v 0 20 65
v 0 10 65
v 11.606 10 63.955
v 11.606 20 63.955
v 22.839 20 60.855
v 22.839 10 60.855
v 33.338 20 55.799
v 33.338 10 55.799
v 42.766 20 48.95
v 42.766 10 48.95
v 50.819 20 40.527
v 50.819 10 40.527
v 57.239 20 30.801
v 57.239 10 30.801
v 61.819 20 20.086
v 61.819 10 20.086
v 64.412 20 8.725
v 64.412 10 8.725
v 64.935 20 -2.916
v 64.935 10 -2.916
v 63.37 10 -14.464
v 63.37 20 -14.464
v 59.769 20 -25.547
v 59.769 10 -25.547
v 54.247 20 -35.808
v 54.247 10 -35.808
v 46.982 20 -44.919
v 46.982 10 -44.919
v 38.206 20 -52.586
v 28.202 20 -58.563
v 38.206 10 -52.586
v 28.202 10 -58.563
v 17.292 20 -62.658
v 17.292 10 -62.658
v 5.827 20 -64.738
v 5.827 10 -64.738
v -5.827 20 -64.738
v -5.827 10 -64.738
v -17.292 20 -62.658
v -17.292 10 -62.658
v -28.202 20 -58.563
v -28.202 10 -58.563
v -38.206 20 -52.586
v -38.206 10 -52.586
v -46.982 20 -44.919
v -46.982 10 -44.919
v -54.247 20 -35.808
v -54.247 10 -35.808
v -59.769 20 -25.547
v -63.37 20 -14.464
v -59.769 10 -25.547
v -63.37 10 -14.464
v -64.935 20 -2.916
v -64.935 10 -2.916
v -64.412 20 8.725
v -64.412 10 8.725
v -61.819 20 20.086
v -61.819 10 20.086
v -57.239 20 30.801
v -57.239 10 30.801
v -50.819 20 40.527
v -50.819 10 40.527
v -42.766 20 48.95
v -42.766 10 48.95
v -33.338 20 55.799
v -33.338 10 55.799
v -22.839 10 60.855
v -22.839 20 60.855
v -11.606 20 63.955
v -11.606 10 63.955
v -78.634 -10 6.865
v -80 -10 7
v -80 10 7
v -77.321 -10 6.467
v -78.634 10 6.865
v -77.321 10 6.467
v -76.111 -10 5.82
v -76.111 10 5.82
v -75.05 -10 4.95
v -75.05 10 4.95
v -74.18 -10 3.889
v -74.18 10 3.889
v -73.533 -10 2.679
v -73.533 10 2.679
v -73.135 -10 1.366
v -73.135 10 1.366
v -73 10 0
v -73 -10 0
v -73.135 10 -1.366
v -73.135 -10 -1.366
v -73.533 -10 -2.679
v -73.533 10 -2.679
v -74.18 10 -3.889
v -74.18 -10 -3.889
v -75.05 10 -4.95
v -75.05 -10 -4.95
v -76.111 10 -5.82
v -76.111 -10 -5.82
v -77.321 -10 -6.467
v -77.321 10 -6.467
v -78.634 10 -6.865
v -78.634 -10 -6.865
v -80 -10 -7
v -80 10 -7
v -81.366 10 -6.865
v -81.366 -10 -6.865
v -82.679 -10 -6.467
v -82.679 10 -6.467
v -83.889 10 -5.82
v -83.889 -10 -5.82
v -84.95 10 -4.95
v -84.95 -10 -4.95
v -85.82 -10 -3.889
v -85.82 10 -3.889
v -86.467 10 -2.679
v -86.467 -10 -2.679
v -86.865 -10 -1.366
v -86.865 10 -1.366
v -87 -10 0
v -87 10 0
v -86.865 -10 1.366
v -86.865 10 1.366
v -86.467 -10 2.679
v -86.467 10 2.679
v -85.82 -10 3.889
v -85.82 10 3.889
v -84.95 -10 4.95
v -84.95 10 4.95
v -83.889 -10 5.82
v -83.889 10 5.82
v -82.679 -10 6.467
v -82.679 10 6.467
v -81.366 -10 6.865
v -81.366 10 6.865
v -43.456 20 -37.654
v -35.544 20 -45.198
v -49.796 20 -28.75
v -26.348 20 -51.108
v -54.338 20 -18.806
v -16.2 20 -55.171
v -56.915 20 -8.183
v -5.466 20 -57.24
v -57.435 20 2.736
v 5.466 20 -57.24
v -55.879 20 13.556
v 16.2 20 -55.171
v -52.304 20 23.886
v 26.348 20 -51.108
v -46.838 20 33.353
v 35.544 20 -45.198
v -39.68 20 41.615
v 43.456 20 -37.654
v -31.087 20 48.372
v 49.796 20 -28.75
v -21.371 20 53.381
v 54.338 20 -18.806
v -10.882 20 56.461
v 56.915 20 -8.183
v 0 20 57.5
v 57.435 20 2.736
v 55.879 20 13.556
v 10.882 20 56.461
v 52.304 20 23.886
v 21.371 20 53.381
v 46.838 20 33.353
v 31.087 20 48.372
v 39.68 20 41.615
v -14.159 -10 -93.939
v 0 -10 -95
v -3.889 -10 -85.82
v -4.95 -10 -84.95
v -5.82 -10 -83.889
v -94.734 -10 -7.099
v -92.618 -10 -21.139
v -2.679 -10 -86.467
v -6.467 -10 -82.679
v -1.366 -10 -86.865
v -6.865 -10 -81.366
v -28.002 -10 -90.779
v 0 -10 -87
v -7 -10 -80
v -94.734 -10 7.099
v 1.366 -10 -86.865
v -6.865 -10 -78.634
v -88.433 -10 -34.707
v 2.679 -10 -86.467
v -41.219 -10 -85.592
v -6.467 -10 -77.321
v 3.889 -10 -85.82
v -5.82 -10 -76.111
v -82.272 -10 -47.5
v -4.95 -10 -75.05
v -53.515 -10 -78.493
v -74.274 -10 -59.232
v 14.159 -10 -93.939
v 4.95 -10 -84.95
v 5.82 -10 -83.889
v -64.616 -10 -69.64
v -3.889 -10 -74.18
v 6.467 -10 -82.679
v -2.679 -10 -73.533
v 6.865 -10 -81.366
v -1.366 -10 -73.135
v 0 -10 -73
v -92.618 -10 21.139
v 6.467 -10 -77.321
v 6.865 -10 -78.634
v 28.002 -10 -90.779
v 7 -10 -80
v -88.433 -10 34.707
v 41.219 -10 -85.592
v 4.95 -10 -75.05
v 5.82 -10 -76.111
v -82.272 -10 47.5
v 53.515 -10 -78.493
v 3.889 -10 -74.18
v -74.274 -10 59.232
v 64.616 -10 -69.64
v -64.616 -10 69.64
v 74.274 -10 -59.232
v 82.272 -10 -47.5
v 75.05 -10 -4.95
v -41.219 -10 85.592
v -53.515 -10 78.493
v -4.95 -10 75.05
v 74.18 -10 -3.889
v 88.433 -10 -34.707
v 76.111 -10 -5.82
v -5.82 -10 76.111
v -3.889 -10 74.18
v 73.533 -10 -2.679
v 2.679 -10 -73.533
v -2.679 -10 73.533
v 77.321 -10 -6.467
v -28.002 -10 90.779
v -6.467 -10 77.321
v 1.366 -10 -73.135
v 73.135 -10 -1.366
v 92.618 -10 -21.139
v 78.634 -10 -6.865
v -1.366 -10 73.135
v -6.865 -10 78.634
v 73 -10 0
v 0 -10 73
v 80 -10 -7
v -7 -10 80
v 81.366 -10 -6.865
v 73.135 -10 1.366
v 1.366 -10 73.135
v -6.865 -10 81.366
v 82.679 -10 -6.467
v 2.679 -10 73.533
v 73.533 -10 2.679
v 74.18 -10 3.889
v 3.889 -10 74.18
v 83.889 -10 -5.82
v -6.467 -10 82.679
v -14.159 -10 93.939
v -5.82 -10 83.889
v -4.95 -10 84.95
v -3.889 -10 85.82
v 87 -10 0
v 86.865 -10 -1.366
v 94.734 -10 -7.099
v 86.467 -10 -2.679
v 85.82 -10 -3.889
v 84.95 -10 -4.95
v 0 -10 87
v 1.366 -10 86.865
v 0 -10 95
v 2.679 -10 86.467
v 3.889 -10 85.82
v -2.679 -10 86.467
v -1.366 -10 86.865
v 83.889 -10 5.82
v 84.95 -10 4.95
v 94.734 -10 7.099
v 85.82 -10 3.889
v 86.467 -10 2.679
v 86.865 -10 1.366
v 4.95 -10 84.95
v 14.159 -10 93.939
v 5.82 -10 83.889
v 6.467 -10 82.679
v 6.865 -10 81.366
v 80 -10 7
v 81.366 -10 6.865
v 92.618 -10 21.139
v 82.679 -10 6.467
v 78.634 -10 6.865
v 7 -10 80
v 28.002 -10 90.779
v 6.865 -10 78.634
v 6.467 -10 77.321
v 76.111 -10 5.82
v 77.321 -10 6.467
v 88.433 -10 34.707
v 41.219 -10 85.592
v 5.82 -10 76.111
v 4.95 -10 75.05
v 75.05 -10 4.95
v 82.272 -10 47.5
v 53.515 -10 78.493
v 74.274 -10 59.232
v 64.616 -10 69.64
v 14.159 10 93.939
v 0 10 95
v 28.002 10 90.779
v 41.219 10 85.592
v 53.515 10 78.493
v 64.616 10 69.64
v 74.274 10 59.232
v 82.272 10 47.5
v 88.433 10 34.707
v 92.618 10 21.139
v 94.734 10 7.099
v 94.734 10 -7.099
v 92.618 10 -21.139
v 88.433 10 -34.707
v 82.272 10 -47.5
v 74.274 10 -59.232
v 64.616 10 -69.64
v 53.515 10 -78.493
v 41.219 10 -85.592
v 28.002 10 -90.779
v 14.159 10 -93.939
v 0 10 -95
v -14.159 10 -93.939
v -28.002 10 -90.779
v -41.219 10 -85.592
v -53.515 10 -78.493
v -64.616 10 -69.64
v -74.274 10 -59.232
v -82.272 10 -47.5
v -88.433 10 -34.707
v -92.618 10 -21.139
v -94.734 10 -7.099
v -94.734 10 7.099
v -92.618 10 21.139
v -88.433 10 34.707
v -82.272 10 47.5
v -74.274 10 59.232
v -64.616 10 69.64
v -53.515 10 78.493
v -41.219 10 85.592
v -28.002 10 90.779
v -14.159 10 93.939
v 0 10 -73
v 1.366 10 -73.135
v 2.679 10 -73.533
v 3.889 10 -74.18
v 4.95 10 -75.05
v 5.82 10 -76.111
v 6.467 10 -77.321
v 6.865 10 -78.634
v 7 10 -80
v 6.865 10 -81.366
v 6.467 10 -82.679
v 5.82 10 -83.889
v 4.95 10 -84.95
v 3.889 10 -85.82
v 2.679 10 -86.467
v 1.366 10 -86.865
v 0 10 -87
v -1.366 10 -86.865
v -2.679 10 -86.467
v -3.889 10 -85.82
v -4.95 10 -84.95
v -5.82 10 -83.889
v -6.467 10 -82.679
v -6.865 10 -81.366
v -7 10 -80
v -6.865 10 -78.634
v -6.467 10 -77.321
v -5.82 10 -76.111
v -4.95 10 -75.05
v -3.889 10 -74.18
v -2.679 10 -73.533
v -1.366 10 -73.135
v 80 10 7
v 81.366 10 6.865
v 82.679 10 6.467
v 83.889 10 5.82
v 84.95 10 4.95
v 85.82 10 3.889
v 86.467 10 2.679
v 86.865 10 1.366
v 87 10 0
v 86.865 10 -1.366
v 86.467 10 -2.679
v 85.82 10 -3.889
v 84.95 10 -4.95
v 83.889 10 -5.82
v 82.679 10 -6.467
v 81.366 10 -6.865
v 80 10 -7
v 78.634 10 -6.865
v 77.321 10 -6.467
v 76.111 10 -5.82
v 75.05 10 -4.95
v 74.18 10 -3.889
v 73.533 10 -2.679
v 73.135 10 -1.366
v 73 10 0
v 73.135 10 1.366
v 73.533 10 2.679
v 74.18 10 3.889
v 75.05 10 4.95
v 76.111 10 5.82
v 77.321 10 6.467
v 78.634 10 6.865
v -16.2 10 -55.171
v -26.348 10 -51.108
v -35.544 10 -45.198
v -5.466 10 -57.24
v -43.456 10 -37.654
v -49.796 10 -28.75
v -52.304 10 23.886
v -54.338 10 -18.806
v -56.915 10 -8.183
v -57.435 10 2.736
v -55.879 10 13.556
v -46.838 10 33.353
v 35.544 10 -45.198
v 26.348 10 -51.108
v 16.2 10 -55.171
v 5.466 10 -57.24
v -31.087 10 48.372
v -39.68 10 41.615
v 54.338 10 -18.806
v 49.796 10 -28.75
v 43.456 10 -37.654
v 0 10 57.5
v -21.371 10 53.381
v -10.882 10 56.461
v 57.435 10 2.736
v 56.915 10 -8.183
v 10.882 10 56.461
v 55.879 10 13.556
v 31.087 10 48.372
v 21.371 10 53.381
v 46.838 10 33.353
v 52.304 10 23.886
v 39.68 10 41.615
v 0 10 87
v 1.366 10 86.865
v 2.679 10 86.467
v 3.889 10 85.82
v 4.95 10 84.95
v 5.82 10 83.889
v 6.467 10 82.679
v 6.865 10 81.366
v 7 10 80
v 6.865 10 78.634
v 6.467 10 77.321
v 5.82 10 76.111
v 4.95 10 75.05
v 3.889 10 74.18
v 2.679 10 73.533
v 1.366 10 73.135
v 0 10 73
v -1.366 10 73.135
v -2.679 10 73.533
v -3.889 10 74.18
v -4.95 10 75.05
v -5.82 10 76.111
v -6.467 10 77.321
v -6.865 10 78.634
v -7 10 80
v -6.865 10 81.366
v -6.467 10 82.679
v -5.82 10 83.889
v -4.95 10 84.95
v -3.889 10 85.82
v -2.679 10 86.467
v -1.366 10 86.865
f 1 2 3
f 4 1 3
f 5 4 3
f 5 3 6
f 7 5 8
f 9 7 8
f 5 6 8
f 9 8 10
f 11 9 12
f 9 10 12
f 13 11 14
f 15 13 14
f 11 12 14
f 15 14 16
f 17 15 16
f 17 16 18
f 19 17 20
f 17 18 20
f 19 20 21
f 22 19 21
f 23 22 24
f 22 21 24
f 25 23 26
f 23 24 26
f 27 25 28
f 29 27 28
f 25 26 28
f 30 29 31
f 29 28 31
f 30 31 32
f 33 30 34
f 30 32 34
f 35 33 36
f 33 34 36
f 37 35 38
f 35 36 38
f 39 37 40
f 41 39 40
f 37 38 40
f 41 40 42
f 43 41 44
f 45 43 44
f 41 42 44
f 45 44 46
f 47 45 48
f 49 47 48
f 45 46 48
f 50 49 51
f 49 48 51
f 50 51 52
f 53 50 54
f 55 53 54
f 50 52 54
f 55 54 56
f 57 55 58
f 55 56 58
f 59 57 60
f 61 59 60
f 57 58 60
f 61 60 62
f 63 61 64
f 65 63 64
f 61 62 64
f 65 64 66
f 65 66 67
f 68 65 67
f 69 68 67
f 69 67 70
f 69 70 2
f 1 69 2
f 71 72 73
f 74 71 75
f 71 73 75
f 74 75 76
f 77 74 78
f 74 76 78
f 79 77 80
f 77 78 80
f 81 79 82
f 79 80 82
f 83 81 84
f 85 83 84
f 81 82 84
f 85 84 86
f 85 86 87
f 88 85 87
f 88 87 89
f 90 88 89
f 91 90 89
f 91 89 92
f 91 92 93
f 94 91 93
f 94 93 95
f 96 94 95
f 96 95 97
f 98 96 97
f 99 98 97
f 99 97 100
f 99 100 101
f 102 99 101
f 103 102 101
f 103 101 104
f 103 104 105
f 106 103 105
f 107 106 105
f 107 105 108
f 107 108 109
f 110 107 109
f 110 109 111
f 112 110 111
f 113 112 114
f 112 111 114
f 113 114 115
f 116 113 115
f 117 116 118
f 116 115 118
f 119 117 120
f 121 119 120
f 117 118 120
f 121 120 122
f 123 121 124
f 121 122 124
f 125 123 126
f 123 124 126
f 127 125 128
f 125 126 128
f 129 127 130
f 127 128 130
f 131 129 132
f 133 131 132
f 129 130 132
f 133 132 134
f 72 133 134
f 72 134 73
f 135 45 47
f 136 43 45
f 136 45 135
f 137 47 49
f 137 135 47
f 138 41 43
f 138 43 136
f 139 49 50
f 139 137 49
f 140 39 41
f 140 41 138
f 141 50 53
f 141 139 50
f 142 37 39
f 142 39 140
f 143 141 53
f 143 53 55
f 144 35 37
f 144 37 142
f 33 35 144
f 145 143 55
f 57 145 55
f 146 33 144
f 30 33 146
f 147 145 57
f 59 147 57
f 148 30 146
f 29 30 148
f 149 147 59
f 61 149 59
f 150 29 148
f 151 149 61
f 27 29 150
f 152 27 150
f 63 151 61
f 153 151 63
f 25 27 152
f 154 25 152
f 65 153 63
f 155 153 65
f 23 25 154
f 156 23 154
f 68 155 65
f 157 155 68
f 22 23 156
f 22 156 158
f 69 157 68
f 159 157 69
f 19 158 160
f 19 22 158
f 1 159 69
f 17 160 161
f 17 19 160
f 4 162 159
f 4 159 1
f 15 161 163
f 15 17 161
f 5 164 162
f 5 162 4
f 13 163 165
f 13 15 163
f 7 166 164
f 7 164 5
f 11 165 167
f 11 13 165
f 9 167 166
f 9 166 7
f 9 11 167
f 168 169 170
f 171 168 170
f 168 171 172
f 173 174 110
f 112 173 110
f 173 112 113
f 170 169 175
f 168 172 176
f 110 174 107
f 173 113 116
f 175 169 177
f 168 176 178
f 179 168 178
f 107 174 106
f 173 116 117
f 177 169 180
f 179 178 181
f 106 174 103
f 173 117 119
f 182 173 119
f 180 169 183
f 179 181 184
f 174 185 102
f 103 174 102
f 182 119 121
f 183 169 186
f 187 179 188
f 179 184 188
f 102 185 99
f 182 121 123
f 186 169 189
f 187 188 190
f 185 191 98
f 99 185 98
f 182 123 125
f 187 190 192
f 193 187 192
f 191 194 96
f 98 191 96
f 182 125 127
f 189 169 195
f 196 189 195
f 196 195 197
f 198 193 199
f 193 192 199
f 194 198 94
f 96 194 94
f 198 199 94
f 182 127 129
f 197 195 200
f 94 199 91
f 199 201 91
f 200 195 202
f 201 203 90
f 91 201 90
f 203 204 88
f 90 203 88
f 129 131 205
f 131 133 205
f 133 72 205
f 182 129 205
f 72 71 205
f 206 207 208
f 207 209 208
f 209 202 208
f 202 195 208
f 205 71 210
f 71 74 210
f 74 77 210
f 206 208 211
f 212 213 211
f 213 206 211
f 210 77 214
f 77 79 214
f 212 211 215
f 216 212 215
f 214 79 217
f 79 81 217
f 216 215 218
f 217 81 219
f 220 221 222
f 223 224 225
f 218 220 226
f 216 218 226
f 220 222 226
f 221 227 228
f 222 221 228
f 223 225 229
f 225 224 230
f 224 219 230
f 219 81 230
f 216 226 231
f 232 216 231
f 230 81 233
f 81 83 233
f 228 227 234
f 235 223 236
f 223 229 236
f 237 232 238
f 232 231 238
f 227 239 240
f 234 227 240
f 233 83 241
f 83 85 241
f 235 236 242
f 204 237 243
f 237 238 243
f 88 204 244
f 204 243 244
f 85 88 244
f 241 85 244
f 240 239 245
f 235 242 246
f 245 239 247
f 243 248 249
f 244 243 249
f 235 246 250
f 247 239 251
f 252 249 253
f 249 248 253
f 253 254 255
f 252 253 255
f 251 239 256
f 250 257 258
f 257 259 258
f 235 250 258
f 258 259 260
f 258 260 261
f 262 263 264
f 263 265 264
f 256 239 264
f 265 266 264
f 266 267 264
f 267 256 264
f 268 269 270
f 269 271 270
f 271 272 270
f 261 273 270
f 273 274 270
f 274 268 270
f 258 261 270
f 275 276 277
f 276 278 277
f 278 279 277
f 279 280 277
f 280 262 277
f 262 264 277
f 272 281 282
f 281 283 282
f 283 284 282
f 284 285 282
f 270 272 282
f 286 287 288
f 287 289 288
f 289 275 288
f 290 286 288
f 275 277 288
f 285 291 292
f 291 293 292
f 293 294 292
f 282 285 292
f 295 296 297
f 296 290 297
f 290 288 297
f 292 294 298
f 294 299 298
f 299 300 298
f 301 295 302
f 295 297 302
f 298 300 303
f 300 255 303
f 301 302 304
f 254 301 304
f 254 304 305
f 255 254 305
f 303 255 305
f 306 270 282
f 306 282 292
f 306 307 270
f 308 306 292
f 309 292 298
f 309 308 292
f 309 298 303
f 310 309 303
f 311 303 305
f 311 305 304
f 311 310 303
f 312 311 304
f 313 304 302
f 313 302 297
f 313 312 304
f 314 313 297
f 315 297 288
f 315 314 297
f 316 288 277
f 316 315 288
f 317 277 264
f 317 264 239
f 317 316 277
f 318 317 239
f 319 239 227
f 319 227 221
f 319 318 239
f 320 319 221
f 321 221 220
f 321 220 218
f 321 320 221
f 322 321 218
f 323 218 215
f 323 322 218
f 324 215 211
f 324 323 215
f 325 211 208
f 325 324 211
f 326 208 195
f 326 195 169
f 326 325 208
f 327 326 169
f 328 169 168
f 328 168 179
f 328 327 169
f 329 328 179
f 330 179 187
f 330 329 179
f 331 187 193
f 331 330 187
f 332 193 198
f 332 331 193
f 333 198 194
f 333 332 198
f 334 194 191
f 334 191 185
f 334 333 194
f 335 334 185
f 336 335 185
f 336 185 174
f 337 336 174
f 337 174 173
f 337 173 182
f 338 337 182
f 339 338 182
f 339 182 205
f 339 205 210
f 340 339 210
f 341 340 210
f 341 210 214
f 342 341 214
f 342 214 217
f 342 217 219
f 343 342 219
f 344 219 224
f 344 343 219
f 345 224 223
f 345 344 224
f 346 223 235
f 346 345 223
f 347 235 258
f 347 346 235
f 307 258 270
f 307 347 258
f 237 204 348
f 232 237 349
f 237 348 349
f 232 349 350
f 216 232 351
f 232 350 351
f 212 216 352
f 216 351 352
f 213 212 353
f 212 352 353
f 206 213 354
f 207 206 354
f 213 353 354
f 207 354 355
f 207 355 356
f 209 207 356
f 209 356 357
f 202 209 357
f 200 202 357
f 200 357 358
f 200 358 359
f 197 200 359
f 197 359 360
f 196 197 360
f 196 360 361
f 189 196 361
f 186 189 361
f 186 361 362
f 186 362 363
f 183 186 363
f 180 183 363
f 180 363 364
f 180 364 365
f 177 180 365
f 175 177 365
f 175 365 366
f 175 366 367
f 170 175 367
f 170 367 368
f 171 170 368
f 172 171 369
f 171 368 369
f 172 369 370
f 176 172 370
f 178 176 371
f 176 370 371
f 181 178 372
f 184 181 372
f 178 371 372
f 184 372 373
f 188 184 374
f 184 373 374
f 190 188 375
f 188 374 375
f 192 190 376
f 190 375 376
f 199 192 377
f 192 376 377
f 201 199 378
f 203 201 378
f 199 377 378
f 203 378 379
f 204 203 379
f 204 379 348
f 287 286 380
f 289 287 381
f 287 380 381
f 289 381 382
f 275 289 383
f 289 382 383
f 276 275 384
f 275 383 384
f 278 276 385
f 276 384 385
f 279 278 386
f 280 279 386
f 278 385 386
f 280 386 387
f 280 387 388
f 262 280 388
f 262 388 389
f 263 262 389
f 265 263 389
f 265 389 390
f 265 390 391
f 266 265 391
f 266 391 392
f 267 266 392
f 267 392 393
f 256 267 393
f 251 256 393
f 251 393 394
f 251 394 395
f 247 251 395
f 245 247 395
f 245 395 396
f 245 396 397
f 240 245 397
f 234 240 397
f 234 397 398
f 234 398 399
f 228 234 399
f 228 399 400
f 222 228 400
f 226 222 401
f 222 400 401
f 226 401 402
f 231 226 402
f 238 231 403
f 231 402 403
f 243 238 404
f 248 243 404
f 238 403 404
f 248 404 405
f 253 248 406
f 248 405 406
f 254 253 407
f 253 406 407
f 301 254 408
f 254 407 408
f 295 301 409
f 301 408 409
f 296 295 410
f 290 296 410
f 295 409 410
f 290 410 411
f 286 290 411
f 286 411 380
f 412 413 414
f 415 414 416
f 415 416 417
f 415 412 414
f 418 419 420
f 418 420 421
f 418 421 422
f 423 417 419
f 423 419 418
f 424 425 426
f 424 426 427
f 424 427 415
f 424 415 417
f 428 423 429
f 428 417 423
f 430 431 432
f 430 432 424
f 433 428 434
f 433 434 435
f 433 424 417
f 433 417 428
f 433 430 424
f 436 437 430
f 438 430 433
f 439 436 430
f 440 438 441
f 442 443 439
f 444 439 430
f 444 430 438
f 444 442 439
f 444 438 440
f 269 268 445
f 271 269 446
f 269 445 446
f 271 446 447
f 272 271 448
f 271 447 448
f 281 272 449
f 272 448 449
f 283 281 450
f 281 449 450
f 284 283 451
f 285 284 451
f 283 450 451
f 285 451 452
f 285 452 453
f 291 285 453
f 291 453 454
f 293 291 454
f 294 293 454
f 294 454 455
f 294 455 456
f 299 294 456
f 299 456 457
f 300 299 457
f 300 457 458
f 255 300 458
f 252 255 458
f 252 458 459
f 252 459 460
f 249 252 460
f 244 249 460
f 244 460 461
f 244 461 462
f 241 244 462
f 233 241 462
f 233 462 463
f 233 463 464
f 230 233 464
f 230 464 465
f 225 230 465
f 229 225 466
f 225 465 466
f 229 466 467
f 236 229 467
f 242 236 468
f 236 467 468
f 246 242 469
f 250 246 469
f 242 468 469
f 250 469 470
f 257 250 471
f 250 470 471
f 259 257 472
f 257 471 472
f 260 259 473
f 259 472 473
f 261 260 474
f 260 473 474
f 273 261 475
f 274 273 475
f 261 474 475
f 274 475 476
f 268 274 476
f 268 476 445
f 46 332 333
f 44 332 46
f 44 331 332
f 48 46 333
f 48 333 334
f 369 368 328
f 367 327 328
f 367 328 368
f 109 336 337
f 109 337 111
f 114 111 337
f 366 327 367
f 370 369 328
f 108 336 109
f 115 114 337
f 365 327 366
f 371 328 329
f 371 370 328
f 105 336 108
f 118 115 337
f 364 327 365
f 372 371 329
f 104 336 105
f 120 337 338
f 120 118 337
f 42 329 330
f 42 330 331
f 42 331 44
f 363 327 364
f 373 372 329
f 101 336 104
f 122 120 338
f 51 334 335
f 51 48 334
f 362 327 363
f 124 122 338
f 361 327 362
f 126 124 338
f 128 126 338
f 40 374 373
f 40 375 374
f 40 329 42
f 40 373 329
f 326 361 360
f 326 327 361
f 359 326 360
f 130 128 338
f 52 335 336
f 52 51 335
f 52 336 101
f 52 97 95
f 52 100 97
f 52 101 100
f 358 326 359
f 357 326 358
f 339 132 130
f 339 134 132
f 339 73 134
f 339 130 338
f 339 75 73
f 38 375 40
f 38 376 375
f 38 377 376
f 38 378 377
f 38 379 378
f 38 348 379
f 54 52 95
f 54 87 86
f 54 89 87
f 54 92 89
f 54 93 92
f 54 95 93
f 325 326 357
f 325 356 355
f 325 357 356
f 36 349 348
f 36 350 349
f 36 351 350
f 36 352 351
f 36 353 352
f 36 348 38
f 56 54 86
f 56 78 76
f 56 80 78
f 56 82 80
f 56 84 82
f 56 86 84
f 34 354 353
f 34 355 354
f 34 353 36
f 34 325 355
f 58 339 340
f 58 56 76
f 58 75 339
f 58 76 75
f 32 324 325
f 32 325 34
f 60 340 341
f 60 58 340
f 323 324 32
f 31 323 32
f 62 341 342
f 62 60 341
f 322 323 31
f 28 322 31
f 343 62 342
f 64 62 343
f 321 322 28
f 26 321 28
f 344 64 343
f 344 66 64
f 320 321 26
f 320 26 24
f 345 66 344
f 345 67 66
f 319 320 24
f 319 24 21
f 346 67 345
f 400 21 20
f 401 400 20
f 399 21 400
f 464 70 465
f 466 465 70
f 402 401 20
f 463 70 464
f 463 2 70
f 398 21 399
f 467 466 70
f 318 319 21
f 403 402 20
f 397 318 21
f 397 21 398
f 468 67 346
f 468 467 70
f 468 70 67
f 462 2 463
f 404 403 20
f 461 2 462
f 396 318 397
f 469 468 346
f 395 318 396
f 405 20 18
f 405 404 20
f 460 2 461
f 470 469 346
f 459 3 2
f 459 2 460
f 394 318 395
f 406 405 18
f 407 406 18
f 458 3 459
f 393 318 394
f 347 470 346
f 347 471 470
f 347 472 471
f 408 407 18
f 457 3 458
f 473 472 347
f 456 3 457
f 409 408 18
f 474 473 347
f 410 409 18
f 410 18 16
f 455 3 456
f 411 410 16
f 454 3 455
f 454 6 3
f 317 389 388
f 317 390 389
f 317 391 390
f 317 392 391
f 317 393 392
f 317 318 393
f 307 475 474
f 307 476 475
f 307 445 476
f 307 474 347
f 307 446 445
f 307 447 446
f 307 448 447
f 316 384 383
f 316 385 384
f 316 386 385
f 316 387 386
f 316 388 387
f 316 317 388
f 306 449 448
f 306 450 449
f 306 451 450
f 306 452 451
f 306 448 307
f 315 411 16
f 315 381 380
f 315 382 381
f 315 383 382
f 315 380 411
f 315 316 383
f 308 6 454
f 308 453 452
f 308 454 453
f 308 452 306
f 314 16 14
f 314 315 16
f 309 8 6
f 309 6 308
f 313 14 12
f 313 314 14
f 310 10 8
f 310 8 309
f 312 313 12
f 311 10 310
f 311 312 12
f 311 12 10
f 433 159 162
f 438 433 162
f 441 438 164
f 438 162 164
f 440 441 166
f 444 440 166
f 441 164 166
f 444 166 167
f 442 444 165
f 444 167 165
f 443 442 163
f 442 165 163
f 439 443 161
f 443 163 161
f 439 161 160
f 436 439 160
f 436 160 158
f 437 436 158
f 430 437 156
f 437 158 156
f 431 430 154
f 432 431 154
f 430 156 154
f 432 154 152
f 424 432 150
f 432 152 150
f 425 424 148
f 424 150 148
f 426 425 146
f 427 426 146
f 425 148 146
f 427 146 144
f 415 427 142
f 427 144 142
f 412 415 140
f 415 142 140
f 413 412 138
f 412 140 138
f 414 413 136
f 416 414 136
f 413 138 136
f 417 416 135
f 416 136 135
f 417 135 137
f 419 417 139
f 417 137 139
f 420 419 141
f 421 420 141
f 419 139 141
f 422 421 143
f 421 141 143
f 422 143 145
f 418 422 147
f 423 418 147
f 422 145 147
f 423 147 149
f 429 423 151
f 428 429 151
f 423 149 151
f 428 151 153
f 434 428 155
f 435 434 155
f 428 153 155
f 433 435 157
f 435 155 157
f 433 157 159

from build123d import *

# Parameters (mm, degrees)
SKETCH1_R           = 95
BOSS_EXTRUDE1_DEPTH = 10
SKETCH2_R           = 65
BOSS_EXTRUDE2_DEPTH = 10
SKETCH3_R           = 57.5
CUT_EXTRUDE1_DEPTH  = 10
SKETCH4_R           = 7
CUT_EXTRUDE2_DEPTH  = 136.830777072


with BuildPart() as part:
    # Sketch1 → Boss-Extrude1 (new, symmetric)
    with BuildSketch(Plane(origin=(0, 0, 0), x_dir=(1, 0, 0), z_dir=(0, 1, 0))):
        with Locations(Location((0, 0, 0), (0, 0, 270))):
            Circle(SKETCH1_R)
    extrude(amount=BOSS_EXTRUDE1_DEPTH, both=True)

    # Sketch2 → Boss-Extrude2 (add)
    with BuildSketch(Plane(origin=(0, 10, 0), x_dir=(1, 0, 0), z_dir=(0, 1, 0))):
        with Locations(Location((0, 0, 0), (0, 0, 270))):
            Circle(SKETCH2_R)
    extrude(amount=BOSS_EXTRUDE2_DEPTH)

    # Sketch3 → Cut-Extrude1 (cut)
    with BuildSketch(Plane(origin=(0, 20, 0), x_dir=(1, 0, 0), z_dir=(0, 1, 0))):
        with Locations(Location((0, 0, 0), (0, 0, 270))):
            Circle(SKETCH3_R)
    extrude(amount=-CUT_EXTRUDE1_DEPTH, mode=Mode.SUBTRACT)

    # Sketch4 → Cut-Extrude2 (cut, through all)
    with BuildSketch(Plane(origin=(0, 10, 0), x_dir=(1, 0, 0), z_dir=(0, 1, 0))):
        with Locations(Location((0, 80, 0), (0, 0, 270))):
            Circle(SKETCH4_R)
        with Locations(Location((80, 0, 0), (0, 0, 270))):
            Circle(SKETCH4_R)
        with Locations(Location((0, -80, 0), (0, 0, 270))):
            Circle(SKETCH4_R)
        with Locations(Location((-80, 0, 0), (0, 0, 270))):
            Circle(SKETCH4_R)
    extrude(amount=-CUT_EXTRUDE2_DEPTH, mode=Mode.SUBTRACT)


solid = part.part
